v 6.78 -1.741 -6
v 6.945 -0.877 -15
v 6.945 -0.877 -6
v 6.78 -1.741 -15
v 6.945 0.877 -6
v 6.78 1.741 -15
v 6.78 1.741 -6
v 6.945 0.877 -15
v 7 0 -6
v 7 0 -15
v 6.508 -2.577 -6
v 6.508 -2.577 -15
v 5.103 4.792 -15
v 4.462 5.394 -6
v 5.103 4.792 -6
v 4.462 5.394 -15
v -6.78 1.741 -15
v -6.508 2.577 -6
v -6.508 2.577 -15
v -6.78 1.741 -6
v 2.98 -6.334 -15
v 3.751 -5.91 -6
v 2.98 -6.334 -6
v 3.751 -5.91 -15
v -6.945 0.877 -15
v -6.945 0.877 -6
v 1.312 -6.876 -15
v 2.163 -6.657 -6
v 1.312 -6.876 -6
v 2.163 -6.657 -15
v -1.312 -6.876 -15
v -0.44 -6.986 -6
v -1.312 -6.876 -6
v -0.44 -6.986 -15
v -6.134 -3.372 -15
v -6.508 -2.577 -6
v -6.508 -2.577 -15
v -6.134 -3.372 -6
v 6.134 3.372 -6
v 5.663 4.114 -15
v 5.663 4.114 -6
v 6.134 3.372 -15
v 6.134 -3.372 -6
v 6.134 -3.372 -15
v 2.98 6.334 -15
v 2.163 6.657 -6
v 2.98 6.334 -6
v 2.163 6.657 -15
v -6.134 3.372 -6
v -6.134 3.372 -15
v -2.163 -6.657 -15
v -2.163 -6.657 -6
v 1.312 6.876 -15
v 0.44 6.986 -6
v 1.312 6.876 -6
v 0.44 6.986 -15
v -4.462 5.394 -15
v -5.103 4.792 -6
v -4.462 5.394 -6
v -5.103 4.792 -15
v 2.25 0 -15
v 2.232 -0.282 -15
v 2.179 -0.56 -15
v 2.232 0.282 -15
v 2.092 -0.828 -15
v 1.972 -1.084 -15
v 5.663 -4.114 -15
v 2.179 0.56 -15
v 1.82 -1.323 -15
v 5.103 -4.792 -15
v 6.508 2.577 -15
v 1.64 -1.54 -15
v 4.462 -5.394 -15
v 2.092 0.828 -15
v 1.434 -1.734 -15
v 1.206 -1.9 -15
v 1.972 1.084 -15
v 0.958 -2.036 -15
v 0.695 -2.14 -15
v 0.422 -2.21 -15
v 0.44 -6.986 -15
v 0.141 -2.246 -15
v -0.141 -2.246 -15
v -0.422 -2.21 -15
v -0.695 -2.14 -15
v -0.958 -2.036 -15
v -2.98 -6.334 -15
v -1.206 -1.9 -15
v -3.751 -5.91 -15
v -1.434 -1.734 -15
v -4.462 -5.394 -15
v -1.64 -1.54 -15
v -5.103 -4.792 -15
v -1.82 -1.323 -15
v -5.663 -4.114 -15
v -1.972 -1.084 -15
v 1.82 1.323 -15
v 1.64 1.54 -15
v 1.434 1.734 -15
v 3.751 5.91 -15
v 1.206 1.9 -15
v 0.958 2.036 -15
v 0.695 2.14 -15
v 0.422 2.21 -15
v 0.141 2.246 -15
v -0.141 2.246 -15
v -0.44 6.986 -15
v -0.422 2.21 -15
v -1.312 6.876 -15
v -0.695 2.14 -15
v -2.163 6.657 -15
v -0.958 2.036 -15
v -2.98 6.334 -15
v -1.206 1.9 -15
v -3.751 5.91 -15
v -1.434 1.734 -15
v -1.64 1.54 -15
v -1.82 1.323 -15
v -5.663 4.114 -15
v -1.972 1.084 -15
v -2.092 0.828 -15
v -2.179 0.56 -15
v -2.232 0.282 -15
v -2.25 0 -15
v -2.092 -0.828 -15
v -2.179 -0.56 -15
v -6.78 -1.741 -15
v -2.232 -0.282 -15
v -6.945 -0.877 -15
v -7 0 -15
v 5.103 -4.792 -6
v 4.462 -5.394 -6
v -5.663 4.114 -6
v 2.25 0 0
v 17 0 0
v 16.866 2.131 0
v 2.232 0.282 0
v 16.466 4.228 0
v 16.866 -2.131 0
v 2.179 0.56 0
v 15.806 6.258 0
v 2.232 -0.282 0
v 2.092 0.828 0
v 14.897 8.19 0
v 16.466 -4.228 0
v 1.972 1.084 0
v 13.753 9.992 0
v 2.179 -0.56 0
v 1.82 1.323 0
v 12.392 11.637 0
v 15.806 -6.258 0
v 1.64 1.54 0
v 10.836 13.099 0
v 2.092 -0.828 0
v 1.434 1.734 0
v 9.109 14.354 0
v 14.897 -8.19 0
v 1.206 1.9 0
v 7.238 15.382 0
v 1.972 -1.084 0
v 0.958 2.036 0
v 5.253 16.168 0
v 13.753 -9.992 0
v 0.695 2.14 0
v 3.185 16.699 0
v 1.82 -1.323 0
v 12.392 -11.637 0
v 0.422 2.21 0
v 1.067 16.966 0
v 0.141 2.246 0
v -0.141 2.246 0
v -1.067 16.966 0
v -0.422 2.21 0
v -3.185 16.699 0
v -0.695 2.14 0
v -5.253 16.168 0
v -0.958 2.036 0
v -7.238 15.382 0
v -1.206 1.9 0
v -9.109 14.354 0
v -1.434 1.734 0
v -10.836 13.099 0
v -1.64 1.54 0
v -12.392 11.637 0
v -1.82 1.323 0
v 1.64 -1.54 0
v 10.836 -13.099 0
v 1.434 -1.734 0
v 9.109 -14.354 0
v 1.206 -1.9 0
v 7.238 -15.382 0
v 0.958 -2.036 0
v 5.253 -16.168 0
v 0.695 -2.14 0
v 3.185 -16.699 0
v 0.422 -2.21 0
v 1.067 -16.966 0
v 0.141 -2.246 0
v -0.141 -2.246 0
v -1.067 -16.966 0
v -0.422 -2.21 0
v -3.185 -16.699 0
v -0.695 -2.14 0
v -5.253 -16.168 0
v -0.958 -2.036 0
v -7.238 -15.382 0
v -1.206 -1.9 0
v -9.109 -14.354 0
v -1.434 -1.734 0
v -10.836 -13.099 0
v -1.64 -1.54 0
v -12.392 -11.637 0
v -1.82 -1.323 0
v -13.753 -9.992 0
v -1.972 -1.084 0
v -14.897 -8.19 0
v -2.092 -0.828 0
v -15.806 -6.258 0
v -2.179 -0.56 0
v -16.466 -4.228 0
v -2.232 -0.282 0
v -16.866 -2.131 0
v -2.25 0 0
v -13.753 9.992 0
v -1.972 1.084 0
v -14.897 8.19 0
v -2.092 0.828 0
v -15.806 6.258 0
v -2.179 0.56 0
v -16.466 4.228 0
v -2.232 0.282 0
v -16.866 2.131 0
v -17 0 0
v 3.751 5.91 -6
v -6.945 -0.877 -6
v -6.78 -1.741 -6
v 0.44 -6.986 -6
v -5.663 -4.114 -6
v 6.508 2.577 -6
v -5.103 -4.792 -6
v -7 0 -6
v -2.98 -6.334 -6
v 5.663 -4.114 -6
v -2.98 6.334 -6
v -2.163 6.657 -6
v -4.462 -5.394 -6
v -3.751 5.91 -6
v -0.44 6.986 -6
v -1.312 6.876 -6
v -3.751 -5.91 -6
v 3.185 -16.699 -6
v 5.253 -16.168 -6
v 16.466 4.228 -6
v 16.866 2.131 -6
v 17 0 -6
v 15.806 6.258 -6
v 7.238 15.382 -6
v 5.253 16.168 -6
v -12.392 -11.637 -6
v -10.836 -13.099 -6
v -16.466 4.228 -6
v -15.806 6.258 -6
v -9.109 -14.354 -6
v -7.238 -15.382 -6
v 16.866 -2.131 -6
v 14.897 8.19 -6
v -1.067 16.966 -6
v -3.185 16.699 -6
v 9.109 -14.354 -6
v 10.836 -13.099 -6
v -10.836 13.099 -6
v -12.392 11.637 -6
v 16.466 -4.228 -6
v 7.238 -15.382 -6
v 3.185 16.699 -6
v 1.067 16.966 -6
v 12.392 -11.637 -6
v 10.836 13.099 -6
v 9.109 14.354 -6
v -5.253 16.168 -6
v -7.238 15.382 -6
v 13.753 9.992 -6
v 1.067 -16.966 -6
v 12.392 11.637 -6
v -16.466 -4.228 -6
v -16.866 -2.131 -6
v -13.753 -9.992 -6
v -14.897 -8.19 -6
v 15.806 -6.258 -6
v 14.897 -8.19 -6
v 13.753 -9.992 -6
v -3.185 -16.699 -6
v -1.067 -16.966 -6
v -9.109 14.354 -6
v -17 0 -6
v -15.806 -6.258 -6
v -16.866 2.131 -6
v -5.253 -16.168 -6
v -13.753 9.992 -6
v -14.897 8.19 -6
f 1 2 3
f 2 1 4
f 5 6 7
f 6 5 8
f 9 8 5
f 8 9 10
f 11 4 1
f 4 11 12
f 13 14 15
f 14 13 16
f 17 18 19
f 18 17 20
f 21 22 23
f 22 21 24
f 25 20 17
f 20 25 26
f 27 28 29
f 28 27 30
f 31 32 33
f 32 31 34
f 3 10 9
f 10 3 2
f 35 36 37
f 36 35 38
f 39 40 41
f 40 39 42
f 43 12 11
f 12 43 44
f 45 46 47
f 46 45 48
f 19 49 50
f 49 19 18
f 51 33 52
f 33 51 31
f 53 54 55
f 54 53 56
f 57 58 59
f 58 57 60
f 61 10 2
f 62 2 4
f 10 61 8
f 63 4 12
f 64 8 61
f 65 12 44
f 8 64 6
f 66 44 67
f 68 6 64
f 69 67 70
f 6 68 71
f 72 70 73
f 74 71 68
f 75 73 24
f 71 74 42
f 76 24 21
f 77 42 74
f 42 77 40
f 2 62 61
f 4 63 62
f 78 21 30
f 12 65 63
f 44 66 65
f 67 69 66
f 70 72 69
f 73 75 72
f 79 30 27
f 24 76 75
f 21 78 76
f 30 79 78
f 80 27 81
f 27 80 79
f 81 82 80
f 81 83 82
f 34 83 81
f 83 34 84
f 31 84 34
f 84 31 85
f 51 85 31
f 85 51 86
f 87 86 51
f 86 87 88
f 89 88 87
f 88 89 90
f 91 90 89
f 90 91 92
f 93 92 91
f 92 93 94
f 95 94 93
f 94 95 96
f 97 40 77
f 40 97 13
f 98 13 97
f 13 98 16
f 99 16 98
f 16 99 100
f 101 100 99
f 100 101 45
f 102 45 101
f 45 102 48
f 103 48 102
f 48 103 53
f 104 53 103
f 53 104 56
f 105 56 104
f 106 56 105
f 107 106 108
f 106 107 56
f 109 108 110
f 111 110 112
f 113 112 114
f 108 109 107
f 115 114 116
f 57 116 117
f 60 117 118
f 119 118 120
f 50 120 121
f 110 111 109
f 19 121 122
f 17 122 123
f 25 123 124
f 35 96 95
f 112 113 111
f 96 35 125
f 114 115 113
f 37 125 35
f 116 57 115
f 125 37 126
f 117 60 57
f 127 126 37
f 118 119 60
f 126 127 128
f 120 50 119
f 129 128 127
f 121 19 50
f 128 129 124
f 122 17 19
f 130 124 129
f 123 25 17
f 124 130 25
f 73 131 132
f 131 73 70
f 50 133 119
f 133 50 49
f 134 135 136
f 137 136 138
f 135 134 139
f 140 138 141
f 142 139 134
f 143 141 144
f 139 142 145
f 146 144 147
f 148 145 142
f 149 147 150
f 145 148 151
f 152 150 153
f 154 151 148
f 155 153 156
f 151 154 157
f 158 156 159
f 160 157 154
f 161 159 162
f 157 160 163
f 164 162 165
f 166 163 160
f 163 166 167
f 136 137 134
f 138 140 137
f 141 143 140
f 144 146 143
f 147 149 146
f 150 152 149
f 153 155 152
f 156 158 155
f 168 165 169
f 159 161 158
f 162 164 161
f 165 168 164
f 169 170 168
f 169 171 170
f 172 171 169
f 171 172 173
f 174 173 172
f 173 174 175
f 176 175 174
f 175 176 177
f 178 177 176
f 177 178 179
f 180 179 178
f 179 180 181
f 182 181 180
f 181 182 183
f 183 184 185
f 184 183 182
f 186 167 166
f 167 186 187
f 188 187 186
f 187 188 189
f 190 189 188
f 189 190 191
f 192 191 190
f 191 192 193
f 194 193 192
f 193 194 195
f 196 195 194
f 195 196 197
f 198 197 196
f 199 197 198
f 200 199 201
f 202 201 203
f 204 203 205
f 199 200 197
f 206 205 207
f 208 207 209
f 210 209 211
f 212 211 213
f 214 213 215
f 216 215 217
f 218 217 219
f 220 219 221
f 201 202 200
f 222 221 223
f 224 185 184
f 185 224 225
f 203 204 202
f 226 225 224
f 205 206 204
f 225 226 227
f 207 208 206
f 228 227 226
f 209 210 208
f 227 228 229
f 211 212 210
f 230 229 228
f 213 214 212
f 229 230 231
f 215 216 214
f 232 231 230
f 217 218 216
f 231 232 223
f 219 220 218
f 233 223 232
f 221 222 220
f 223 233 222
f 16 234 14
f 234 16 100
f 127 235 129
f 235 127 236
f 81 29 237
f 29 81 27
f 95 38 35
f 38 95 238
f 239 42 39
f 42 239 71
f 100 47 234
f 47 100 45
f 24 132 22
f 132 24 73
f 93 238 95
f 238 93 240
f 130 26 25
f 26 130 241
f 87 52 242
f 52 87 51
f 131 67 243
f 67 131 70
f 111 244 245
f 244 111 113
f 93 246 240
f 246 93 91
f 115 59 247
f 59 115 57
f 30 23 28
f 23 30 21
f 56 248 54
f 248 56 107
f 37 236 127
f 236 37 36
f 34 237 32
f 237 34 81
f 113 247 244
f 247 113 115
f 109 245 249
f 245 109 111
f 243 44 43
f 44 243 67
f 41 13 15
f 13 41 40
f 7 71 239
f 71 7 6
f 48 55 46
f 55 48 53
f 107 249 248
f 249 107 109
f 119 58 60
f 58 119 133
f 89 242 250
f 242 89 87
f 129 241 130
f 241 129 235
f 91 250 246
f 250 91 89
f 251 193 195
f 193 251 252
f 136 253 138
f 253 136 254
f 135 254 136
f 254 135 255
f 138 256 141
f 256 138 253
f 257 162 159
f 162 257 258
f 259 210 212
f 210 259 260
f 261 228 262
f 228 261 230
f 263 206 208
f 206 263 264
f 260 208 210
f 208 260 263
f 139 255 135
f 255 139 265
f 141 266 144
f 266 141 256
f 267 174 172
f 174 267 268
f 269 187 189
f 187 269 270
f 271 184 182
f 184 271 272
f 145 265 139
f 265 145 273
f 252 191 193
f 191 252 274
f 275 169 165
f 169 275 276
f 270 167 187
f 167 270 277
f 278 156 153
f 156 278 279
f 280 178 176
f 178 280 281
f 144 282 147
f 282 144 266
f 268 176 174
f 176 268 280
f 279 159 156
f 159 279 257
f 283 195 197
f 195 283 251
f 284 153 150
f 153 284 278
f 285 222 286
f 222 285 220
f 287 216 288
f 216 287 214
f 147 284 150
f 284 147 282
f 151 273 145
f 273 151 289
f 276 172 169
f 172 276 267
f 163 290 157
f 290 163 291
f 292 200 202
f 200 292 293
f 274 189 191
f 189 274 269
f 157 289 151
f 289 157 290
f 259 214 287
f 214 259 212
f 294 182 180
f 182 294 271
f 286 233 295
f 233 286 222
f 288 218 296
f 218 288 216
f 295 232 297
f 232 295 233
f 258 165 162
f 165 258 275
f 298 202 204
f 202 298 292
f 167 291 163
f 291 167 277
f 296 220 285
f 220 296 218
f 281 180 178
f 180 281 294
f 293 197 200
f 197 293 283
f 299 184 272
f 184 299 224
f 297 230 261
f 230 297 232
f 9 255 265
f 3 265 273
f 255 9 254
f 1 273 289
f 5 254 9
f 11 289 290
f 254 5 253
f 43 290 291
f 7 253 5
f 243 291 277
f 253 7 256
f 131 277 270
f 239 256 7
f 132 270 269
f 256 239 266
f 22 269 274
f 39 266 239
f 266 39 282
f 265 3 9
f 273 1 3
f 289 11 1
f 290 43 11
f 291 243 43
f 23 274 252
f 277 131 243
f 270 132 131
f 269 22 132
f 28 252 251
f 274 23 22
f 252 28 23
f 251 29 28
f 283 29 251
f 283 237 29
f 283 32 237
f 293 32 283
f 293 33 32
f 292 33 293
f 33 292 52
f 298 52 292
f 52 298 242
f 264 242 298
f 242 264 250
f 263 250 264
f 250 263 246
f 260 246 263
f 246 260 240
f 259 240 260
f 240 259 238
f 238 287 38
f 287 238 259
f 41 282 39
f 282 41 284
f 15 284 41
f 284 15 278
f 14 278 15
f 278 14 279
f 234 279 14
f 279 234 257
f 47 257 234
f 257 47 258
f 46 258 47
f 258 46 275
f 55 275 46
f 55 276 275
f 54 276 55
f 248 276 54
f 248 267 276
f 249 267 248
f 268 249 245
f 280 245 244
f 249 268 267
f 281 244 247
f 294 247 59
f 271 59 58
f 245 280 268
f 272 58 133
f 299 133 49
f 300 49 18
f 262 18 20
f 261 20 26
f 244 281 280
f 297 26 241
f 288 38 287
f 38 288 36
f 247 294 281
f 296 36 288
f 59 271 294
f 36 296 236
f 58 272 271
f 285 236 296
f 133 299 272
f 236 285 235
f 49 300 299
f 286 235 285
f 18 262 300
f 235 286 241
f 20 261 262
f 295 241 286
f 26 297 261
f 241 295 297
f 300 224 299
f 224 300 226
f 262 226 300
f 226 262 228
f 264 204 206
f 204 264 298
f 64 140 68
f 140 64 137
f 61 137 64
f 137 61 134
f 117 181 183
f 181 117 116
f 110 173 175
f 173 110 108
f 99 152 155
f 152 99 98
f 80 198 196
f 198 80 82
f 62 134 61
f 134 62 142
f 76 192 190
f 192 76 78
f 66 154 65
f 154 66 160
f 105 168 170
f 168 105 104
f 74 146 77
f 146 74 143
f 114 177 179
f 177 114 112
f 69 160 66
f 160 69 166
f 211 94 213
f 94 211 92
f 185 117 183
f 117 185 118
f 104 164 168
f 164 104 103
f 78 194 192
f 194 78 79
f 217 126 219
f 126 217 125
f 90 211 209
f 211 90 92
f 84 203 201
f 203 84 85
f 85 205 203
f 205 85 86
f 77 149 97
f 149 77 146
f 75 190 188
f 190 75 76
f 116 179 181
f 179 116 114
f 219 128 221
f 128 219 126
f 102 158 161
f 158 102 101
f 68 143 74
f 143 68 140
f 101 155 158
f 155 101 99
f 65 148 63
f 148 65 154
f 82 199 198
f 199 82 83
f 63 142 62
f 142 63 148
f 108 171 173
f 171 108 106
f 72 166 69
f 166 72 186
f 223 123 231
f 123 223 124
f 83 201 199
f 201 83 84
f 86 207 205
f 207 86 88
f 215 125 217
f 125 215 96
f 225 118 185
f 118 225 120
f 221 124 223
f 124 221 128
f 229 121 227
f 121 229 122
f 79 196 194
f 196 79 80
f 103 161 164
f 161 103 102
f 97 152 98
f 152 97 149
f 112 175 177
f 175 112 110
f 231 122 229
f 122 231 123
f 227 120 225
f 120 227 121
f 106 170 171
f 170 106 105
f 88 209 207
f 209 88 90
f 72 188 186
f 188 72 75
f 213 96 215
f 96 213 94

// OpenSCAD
$fn = 50;


difference() {
	union() {
		translate(v = [0, 0, -15.0000000000]) {
			cylinder(h = 15, r = 7.0000000000);
		}
		translate(v = [0, 0, -6.0000000000]) {
			cylinder(h = 6, r = 17.0000000000);
		}
	}
	union() {
		#translate(v = [0, 0, -15]) {
			cylinder(h = 15, r = 2.2500000000);
		}
	}
}
